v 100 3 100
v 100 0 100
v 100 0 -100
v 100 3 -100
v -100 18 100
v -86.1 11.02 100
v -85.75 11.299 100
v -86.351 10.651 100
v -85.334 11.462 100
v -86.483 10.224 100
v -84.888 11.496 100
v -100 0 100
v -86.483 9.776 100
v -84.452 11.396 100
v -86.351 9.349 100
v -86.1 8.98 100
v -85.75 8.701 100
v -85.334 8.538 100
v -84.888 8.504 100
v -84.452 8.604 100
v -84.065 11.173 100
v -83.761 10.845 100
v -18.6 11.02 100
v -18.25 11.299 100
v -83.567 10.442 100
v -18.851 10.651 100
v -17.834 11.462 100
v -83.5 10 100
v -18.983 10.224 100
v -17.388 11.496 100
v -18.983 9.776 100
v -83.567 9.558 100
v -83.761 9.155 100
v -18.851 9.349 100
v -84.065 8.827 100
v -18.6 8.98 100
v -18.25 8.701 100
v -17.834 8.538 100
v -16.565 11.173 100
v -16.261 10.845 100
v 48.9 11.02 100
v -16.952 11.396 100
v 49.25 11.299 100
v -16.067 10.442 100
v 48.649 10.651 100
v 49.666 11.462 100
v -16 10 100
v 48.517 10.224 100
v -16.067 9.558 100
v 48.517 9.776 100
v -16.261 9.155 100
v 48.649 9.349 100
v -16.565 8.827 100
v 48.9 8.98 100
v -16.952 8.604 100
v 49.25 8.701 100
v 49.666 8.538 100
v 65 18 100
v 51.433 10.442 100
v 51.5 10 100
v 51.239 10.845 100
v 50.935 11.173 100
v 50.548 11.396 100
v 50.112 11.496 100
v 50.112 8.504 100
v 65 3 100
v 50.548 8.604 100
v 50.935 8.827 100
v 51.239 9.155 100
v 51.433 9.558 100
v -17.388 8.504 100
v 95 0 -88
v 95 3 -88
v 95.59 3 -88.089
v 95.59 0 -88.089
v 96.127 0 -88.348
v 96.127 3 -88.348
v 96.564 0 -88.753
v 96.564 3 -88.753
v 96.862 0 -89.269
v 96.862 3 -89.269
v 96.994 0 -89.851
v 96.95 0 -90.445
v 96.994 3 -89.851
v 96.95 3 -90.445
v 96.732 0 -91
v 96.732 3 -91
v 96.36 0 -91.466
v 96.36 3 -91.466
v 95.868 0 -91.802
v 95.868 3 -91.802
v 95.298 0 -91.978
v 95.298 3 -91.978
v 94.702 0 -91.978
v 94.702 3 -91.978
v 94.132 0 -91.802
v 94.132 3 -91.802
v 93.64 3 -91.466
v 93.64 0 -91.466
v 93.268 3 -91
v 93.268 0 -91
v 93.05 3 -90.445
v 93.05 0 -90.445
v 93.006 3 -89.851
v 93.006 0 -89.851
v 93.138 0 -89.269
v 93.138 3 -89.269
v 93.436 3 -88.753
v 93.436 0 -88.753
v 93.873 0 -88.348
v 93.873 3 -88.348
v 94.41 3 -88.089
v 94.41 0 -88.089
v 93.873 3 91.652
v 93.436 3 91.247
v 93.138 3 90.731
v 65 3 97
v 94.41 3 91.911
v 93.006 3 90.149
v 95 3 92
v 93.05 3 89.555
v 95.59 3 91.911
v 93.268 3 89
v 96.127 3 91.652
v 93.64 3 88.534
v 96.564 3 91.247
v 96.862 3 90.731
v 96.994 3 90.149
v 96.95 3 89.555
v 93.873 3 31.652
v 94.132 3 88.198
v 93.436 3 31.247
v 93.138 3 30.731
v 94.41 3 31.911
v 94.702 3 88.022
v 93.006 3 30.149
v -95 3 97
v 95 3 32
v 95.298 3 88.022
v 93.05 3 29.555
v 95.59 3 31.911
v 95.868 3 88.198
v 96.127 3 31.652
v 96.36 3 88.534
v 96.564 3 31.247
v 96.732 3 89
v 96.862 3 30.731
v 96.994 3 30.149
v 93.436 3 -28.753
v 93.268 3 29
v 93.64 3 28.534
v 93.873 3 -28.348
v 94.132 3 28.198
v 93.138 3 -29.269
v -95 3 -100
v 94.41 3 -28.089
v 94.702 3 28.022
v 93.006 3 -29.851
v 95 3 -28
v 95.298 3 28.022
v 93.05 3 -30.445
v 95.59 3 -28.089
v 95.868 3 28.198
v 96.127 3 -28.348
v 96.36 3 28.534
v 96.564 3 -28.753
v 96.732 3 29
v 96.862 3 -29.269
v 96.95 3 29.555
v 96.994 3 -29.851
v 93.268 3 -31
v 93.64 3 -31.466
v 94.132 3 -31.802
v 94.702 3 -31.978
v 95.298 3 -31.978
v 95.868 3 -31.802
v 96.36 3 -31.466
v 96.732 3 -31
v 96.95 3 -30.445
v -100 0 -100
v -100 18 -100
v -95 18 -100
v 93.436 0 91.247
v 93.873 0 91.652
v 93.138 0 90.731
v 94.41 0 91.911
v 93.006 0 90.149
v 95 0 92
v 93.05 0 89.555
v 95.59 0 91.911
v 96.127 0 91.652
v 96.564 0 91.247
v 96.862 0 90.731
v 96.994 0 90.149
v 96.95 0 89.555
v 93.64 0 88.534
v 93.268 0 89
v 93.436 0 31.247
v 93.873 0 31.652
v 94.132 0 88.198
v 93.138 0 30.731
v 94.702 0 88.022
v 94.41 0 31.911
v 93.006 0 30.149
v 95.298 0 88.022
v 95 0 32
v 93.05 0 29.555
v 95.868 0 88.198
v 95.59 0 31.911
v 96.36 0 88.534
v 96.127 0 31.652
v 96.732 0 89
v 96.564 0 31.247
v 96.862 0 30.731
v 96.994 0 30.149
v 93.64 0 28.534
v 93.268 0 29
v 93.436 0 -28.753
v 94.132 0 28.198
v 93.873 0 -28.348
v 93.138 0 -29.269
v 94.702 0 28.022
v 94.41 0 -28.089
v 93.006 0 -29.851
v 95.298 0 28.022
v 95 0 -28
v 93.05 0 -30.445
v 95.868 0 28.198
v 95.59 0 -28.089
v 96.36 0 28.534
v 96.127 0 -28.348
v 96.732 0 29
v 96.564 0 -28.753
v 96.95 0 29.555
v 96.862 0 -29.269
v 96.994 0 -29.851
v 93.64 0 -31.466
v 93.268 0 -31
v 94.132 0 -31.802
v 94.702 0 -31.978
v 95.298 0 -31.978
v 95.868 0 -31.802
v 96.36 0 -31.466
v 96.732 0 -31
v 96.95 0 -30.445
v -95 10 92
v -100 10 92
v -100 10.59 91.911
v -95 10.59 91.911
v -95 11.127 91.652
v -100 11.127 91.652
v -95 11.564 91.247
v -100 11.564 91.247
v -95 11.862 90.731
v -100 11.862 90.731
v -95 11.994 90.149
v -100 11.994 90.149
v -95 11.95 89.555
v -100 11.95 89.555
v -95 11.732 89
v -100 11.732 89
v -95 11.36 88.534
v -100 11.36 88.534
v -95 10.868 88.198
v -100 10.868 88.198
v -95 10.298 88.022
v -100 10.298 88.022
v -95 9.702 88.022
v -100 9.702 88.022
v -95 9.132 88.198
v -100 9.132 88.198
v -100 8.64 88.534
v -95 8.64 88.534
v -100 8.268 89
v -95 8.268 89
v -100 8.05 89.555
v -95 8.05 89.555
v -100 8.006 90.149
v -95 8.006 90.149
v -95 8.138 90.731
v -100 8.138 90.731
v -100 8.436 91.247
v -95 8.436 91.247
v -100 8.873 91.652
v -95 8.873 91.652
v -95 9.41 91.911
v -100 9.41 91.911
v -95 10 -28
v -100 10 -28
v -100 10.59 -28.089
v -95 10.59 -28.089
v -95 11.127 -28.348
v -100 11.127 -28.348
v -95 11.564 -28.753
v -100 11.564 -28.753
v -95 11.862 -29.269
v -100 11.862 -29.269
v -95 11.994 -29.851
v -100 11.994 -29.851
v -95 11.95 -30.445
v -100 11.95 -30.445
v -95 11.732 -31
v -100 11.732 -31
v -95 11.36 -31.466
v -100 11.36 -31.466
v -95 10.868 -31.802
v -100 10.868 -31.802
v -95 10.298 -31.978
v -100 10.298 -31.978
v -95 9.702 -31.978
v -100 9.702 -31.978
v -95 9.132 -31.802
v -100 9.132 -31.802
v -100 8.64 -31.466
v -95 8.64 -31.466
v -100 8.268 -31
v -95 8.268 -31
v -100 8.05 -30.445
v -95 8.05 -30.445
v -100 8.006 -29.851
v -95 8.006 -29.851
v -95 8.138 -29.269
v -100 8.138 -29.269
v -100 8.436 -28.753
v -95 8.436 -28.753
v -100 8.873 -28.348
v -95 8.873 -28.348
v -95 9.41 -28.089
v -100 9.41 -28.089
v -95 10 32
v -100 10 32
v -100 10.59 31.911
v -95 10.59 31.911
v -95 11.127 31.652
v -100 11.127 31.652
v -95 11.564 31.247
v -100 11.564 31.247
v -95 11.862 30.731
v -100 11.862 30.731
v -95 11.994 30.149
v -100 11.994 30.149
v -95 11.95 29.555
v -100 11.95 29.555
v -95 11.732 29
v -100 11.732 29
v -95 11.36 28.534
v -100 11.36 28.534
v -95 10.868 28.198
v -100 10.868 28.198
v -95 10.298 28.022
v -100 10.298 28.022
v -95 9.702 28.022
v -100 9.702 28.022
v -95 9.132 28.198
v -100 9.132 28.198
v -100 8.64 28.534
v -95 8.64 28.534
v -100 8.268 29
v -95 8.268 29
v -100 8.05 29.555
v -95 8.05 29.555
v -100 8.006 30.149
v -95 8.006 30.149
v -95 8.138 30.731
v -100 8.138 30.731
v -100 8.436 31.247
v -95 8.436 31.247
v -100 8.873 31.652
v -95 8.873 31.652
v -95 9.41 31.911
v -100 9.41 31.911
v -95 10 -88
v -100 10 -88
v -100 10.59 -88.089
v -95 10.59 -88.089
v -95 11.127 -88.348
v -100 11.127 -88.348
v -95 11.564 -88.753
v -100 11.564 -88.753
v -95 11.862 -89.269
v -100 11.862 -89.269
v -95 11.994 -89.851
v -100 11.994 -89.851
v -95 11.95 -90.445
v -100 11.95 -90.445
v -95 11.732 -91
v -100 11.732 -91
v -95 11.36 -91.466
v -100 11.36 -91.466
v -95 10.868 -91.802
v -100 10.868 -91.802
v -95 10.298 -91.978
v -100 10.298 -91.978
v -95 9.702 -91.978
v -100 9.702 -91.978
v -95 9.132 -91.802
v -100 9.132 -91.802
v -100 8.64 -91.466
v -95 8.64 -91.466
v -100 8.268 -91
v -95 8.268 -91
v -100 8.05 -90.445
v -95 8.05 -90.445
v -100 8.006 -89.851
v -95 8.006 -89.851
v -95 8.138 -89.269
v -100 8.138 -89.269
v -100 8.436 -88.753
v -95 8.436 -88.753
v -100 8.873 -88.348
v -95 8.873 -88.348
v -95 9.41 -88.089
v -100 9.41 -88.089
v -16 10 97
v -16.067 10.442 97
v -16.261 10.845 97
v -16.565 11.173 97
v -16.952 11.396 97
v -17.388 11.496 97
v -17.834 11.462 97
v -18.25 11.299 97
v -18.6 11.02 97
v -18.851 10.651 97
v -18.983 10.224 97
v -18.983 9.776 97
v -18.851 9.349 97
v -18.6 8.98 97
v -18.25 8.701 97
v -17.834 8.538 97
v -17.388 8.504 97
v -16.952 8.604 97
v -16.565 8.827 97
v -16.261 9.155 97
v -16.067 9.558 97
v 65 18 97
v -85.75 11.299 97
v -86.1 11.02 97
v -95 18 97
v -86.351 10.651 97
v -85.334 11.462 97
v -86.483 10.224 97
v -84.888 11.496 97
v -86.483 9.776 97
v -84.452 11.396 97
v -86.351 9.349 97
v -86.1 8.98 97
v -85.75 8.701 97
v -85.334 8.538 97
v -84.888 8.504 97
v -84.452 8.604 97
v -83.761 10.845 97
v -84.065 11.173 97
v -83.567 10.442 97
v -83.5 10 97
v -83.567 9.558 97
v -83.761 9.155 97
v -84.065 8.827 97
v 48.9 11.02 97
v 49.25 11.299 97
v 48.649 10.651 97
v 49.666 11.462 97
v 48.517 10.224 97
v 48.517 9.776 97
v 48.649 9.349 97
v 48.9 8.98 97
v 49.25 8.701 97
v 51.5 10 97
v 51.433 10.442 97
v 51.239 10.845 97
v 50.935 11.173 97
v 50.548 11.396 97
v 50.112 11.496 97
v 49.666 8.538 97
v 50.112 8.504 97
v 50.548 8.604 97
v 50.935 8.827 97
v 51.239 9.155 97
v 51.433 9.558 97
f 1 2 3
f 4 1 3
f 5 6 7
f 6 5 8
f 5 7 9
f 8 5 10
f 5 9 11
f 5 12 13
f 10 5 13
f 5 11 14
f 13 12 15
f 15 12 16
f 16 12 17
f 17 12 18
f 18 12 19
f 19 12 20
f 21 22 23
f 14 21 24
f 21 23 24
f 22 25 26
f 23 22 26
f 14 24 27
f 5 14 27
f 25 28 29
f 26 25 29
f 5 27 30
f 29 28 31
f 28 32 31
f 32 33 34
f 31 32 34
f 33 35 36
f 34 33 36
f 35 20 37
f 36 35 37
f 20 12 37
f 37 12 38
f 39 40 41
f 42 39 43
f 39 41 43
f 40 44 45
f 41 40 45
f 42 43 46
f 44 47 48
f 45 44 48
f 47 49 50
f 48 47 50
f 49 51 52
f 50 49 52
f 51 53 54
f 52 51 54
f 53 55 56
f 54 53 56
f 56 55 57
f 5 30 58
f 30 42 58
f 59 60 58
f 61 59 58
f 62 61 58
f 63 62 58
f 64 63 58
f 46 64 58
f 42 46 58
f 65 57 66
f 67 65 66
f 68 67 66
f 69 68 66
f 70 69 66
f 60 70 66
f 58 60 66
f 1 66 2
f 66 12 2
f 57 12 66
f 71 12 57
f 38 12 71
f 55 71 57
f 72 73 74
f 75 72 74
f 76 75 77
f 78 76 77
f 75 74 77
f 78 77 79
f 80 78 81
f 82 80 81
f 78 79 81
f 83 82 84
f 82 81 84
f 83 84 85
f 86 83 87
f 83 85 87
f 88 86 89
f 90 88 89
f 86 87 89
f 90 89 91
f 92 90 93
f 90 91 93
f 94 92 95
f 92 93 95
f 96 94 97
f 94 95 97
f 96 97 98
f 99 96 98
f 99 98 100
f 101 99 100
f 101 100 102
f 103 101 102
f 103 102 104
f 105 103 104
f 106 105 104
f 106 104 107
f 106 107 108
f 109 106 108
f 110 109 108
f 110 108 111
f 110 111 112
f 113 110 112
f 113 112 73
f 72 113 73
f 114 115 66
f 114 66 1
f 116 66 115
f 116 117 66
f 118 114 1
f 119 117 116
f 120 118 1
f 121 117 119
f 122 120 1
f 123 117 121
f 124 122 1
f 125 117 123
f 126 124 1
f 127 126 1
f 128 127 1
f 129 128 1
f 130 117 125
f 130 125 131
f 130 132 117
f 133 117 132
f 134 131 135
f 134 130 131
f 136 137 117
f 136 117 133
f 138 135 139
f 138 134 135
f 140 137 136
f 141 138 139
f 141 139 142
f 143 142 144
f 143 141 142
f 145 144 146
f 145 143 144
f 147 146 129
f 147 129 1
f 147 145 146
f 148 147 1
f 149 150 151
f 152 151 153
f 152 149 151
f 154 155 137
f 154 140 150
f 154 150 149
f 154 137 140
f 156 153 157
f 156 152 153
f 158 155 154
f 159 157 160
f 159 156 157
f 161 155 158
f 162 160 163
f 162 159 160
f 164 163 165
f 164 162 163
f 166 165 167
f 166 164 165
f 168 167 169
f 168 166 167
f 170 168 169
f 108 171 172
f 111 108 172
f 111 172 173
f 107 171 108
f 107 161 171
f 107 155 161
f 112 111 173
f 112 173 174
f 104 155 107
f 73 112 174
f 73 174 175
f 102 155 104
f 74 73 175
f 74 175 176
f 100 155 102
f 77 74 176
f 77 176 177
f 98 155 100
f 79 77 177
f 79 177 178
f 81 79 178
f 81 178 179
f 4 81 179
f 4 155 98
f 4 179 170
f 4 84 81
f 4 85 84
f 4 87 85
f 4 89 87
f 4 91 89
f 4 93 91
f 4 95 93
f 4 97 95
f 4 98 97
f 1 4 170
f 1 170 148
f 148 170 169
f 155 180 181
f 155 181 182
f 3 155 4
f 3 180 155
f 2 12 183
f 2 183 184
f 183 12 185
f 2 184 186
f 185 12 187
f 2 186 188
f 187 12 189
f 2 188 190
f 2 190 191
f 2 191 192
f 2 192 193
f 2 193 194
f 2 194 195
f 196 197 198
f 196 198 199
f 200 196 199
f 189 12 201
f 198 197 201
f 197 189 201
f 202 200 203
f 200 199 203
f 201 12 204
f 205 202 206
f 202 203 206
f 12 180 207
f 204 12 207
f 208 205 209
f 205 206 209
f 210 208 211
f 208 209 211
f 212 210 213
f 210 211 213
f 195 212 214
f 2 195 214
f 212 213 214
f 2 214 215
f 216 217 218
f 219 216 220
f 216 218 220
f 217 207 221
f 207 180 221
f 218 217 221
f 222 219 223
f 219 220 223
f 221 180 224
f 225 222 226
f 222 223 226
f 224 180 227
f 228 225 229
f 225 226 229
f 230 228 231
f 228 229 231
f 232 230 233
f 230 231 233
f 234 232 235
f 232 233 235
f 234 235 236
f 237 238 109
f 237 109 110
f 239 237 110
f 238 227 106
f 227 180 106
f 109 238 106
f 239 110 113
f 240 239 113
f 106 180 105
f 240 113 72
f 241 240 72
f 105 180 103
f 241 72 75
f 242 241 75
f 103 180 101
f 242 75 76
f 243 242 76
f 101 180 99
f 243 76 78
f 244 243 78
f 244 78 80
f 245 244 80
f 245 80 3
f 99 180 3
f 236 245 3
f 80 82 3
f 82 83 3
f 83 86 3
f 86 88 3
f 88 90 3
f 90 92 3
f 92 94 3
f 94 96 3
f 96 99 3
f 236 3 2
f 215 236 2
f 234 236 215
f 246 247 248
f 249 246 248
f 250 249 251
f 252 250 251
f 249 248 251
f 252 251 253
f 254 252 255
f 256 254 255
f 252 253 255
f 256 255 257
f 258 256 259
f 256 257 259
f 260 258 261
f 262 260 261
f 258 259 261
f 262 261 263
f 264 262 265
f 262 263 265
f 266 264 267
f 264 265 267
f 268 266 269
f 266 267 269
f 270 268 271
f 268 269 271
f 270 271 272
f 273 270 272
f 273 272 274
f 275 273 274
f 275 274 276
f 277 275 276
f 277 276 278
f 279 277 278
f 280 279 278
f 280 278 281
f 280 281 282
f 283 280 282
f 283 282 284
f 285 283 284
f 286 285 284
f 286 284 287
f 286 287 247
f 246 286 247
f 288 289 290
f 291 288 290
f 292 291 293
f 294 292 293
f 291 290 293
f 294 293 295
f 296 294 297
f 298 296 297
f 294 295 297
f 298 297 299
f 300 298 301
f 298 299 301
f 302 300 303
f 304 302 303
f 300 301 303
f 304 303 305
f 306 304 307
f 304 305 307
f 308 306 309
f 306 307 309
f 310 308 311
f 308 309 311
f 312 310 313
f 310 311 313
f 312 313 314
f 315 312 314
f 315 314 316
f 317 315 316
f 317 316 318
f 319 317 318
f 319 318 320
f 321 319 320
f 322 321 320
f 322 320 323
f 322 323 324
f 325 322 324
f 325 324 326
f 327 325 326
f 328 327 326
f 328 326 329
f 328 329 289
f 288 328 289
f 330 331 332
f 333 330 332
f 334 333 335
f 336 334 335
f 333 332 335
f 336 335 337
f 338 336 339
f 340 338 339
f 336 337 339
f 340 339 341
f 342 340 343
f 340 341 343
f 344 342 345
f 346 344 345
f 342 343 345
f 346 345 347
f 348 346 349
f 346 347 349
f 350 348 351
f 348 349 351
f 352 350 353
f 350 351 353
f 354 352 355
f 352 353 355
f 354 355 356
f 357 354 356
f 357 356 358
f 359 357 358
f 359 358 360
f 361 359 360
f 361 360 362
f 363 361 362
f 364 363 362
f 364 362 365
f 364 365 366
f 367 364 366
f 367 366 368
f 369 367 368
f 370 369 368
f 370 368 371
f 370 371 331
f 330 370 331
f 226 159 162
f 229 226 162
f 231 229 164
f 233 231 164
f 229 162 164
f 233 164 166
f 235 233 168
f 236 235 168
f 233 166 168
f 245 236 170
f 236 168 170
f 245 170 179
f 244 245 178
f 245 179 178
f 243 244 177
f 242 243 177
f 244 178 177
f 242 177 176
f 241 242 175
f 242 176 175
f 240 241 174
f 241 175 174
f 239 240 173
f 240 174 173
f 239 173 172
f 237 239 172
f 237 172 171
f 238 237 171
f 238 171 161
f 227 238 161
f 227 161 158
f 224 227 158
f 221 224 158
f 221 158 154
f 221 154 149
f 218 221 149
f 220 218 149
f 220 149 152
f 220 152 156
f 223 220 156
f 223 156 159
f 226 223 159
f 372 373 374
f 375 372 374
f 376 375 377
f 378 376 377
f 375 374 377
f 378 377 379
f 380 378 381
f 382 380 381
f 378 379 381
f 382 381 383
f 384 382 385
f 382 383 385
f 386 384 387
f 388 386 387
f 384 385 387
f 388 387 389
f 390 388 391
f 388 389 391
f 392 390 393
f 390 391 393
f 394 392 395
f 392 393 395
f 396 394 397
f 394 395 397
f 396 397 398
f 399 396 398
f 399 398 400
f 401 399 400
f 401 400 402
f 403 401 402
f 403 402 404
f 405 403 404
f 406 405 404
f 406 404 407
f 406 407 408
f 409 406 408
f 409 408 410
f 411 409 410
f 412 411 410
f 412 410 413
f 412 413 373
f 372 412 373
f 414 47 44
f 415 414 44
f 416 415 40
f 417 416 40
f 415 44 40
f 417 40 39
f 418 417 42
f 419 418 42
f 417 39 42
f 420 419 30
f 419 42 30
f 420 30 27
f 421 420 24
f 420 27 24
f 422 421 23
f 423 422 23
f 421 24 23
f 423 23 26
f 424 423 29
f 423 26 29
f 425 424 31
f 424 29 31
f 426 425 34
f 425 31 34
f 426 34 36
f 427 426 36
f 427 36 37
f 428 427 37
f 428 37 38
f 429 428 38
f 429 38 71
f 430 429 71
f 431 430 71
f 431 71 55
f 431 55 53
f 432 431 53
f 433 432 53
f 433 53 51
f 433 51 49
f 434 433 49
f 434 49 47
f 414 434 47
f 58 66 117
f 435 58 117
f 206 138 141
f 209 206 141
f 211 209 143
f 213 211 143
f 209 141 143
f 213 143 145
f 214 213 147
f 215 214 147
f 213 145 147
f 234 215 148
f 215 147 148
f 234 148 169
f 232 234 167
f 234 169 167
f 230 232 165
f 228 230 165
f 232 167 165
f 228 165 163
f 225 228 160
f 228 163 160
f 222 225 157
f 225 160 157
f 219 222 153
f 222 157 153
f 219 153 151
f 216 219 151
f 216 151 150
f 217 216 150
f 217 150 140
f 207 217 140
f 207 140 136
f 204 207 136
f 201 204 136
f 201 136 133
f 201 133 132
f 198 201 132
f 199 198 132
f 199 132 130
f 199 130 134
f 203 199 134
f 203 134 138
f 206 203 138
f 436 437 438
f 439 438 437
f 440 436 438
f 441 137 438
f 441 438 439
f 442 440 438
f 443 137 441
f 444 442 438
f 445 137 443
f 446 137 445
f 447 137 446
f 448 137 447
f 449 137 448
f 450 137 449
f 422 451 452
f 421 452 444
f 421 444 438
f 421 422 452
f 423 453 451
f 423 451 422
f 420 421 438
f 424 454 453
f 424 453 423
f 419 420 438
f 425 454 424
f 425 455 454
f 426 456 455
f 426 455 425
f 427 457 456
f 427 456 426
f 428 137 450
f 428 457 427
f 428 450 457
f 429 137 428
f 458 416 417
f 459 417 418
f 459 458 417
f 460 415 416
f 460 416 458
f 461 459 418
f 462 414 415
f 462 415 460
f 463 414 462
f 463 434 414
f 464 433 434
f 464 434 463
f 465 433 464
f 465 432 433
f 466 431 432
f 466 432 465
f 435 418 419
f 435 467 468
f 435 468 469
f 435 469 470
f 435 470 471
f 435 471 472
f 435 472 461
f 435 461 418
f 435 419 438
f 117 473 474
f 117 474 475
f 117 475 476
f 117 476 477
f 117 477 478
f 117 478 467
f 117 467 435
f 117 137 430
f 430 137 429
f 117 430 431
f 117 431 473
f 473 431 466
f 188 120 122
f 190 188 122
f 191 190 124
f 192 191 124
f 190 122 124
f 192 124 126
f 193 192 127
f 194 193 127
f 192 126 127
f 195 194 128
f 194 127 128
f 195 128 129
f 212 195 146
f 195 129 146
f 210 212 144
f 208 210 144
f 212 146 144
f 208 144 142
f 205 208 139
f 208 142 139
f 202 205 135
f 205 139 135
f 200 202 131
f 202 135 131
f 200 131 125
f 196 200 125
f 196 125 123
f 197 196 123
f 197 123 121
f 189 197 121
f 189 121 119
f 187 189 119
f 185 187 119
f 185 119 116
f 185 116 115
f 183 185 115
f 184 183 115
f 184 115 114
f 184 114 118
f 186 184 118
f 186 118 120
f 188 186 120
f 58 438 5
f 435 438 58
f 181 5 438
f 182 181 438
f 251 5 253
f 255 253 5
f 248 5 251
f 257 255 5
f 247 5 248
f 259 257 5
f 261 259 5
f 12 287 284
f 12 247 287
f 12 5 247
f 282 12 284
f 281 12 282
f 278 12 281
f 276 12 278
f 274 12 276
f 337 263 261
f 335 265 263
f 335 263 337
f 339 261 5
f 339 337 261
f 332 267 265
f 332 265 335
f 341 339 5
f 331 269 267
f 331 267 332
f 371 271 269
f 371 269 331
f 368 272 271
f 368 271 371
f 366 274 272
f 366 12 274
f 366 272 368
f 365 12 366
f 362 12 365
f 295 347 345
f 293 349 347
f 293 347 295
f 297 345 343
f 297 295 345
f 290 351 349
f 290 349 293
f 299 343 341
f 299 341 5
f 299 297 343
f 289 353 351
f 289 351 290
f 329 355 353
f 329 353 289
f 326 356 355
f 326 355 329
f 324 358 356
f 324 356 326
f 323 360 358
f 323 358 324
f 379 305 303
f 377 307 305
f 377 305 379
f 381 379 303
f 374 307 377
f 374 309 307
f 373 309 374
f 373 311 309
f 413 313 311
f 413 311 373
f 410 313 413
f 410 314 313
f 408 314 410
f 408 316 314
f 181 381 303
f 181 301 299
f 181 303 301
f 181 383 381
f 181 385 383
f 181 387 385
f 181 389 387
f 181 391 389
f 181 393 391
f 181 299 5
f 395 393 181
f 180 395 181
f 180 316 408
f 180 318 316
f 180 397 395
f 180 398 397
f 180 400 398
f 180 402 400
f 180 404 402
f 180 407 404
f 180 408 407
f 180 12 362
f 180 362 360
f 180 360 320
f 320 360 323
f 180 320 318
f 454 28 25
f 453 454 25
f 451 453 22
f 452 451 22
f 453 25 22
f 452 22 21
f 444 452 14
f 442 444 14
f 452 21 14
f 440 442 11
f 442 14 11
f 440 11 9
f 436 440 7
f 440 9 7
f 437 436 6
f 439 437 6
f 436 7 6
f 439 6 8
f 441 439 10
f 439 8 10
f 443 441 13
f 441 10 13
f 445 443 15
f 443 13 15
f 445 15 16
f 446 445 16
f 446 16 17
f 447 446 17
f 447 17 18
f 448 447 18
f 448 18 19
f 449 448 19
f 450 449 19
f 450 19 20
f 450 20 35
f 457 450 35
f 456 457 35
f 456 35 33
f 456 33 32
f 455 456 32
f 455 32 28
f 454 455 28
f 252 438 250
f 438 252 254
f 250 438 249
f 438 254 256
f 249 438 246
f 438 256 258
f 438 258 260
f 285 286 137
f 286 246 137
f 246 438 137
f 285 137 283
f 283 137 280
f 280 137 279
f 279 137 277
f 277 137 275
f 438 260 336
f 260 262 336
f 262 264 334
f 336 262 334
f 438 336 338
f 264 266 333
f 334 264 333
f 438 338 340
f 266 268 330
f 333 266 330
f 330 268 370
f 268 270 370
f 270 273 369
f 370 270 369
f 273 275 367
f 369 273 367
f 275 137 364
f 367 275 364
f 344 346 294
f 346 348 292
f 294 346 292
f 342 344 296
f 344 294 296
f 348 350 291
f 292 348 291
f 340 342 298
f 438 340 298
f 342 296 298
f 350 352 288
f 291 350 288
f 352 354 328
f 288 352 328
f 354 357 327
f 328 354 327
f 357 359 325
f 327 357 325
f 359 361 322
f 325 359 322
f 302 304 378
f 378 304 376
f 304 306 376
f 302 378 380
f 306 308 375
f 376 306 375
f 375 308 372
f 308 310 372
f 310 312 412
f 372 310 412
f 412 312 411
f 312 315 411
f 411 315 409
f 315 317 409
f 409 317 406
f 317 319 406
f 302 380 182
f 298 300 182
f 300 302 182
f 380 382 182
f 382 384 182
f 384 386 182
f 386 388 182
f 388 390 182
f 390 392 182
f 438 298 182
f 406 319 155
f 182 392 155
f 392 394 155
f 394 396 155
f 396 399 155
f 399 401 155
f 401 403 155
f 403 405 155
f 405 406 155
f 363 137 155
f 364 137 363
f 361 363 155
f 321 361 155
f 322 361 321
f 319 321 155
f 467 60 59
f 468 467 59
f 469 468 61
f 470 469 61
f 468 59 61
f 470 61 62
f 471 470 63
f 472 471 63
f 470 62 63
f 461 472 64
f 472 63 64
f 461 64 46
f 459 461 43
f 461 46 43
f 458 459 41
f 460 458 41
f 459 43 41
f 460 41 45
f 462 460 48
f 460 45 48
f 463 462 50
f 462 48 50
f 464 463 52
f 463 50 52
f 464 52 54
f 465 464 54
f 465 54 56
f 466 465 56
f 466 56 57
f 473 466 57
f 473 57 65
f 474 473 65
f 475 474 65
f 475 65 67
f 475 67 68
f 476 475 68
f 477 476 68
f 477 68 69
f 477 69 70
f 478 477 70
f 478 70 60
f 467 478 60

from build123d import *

# Parameters (mm, degrees)
SKETCH1_W           = 200
SKETCH1_H           = 200
BOSS_EXTRUDE1_DEPTH = 3
SKETCH2_W           = 5
SKETCH2_H           = 200
BOSS_EXTRUDE2_DEPTH = 15
CUT_EXTRUDE1_REACH  = 226.33
SKETCH3_R           = 2
LPATTERN1_COUNT     = 4
LPATTERN1_PITCH     = 60
CUT_EXTRUDE2_REACH  = 144.215
SKETCH4_R           = 2
LPATTERN2_COUNT     = 4
LPATTERN2_PITCH     = 60
SKETCH5_W           = 160
SKETCH5_H           = 3
BOSS_EXTRUDE3_DEPTH = 15
CUT_EXTRUDE3_REACH  = 226.33
SKETCH6_R           = 1.5


with BuildPart() as part:
    # Sketch1 → Boss-Extrude1 (new body)
    with BuildSketch(Plane(origin=(0, 0, 0), x_dir=(1, 0, 0), z_dir=(0, 1, 0))):
        Rectangle(SKETCH1_W, SKETCH1_H)
    extrude(amount=BOSS_EXTRUDE1_DEPTH)

    # Sketch2 → Boss-Extrude2 (add)
    with BuildSketch(Plane(origin=(0, 3, 0), x_dir=(1, 0, 0), z_dir=(0, 1, 0))):
        with Locations((-97.5, 0)):
            Rectangle(SKETCH2_W, SKETCH2_H)
    extrude(amount=BOSS_EXTRUDE2_DEPTH)

    # Sketch3 → Cut-Extrude1 (cut, up to next)
    with BuildSketch(Plane.ZY.offset(100), mode=Mode.PRIVATE) as cut_extrude1_sk1:
        with Locations((90, 10)):
            Circle(SKETCH3_R)
    cut_extrude1_tool1 = extrude(cut_extrude1_sk1.sketch, amount=-CUT_EXTRUDE1_REACH, mode=Mode.PRIVATE) & part.part
    cut_extrude1 = cut_extrude1_tool1.solids().sort_by_distance((-100, 10, 90))[0]
    add(cut_extrude1, mode=Mode.SUBTRACT)

    # LPattern1: Cut-Extrude1 ×4
    with Locations(*[(0, 0, -i * LPATTERN1_PITCH) for i in range(1, LPATTERN1_COUNT)]):
        add(cut_extrude1, mode=Mode.SUBTRACT)

    # Sketch4 → Cut-Extrude2 (cut, up to next)
    with BuildSketch(Plane(origin=(0, 3, 0), x_dir=(1, 0, 0), z_dir=(0, 1, 0)), mode=Mode.PRIVATE) as cut_extrude2_sk1:
        with Locations(Location((95, 90, 0), (0, 0, 270))):
            Circle(SKETCH4_R)
    cut_extrude2_tool1 = extrude(cut_extrude2_sk1.sketch, amount=-CUT_EXTRUDE2_REACH, mode=Mode.PRIVATE) & part.part
    cut_extrude2 = cut_extrude2_tool1.solids().sort_by_distance((95, 3, -90))[0]
    add(cut_extrude2, mode=Mode.SUBTRACT)

    # LPattern2: Cut-Extrude2 ×4
    with Locations(*[(0, 0, i * LPATTERN2_PITCH) for i in range(1, LPATTERN2_COUNT)]):
        add(cut_extrude2, mode=Mode.SUBTRACT)

    # Sketch5 → Boss-Extrude3 (add)
    with BuildSketch(Plane(origin=(0, 3, 0), x_dir=(1, 0, 0), z_dir=(0, 1, 0))):
        with Locations((-15, -98.5)):
            Rectangle(SKETCH5_W, SKETCH5_H)
    extrude(amount=BOSS_EXTRUDE3_DEPTH)

    # Sketch6 → Cut-Extrude3 (cut, up to next)
    with BuildSketch(Plane.XY.offset(100), mode=Mode.PRIVATE) as cut_extrude3_sk1:
        with Locations((-85, 10)):
            Circle(SKETCH6_R)
    cut_extrude3_tool1 = extrude(cut_extrude3_sk1.sketch, amount=-CUT_EXTRUDE3_REACH, mode=Mode.PRIVATE) & part.part
    # Sketch6 → Cut-Extrude3 (cut, up to next)
    with BuildSketch(Plane.XY.offset(100), mode=Mode.PRIVATE) as cut_extrude3_sk2:
        with Locations((-17.5, 10)):
            Circle(SKETCH6_R)
    cut_extrude3_tool2 = extrude(cut_extrude3_sk2.sketch, amount=-CUT_EXTRUDE3_REACH, mode=Mode.PRIVATE) & part.part
    # Sketch6 → Cut-Extrude3 (cut, up to next)
    with BuildSketch(Plane.XY.offset(100), mode=Mode.PRIVATE) as cut_extrude3_sk3:
        with Locations((50, 10)):
            Circle(SKETCH6_R)
    cut_extrude3_tool3 = extrude(cut_extrude3_sk3.sketch, amount=-CUT_EXTRUDE3_REACH, mode=Mode.PRIVATE) & part.part
    add(cut_extrude3_tool1.solids().sort_by_distance((-85, 10, 100))[0], mode=Mode.SUBTRACT)
    add(cut_extrude3_tool2.solids().sort_by_distance((-17.5, 10, 100))[0], mode=Mode.SUBTRACT)
    add(cut_extrude3_tool3.solids().sort_by_distance((50, 10, 100))[0], mode=Mode.SUBTRACT)


solid = part.part
